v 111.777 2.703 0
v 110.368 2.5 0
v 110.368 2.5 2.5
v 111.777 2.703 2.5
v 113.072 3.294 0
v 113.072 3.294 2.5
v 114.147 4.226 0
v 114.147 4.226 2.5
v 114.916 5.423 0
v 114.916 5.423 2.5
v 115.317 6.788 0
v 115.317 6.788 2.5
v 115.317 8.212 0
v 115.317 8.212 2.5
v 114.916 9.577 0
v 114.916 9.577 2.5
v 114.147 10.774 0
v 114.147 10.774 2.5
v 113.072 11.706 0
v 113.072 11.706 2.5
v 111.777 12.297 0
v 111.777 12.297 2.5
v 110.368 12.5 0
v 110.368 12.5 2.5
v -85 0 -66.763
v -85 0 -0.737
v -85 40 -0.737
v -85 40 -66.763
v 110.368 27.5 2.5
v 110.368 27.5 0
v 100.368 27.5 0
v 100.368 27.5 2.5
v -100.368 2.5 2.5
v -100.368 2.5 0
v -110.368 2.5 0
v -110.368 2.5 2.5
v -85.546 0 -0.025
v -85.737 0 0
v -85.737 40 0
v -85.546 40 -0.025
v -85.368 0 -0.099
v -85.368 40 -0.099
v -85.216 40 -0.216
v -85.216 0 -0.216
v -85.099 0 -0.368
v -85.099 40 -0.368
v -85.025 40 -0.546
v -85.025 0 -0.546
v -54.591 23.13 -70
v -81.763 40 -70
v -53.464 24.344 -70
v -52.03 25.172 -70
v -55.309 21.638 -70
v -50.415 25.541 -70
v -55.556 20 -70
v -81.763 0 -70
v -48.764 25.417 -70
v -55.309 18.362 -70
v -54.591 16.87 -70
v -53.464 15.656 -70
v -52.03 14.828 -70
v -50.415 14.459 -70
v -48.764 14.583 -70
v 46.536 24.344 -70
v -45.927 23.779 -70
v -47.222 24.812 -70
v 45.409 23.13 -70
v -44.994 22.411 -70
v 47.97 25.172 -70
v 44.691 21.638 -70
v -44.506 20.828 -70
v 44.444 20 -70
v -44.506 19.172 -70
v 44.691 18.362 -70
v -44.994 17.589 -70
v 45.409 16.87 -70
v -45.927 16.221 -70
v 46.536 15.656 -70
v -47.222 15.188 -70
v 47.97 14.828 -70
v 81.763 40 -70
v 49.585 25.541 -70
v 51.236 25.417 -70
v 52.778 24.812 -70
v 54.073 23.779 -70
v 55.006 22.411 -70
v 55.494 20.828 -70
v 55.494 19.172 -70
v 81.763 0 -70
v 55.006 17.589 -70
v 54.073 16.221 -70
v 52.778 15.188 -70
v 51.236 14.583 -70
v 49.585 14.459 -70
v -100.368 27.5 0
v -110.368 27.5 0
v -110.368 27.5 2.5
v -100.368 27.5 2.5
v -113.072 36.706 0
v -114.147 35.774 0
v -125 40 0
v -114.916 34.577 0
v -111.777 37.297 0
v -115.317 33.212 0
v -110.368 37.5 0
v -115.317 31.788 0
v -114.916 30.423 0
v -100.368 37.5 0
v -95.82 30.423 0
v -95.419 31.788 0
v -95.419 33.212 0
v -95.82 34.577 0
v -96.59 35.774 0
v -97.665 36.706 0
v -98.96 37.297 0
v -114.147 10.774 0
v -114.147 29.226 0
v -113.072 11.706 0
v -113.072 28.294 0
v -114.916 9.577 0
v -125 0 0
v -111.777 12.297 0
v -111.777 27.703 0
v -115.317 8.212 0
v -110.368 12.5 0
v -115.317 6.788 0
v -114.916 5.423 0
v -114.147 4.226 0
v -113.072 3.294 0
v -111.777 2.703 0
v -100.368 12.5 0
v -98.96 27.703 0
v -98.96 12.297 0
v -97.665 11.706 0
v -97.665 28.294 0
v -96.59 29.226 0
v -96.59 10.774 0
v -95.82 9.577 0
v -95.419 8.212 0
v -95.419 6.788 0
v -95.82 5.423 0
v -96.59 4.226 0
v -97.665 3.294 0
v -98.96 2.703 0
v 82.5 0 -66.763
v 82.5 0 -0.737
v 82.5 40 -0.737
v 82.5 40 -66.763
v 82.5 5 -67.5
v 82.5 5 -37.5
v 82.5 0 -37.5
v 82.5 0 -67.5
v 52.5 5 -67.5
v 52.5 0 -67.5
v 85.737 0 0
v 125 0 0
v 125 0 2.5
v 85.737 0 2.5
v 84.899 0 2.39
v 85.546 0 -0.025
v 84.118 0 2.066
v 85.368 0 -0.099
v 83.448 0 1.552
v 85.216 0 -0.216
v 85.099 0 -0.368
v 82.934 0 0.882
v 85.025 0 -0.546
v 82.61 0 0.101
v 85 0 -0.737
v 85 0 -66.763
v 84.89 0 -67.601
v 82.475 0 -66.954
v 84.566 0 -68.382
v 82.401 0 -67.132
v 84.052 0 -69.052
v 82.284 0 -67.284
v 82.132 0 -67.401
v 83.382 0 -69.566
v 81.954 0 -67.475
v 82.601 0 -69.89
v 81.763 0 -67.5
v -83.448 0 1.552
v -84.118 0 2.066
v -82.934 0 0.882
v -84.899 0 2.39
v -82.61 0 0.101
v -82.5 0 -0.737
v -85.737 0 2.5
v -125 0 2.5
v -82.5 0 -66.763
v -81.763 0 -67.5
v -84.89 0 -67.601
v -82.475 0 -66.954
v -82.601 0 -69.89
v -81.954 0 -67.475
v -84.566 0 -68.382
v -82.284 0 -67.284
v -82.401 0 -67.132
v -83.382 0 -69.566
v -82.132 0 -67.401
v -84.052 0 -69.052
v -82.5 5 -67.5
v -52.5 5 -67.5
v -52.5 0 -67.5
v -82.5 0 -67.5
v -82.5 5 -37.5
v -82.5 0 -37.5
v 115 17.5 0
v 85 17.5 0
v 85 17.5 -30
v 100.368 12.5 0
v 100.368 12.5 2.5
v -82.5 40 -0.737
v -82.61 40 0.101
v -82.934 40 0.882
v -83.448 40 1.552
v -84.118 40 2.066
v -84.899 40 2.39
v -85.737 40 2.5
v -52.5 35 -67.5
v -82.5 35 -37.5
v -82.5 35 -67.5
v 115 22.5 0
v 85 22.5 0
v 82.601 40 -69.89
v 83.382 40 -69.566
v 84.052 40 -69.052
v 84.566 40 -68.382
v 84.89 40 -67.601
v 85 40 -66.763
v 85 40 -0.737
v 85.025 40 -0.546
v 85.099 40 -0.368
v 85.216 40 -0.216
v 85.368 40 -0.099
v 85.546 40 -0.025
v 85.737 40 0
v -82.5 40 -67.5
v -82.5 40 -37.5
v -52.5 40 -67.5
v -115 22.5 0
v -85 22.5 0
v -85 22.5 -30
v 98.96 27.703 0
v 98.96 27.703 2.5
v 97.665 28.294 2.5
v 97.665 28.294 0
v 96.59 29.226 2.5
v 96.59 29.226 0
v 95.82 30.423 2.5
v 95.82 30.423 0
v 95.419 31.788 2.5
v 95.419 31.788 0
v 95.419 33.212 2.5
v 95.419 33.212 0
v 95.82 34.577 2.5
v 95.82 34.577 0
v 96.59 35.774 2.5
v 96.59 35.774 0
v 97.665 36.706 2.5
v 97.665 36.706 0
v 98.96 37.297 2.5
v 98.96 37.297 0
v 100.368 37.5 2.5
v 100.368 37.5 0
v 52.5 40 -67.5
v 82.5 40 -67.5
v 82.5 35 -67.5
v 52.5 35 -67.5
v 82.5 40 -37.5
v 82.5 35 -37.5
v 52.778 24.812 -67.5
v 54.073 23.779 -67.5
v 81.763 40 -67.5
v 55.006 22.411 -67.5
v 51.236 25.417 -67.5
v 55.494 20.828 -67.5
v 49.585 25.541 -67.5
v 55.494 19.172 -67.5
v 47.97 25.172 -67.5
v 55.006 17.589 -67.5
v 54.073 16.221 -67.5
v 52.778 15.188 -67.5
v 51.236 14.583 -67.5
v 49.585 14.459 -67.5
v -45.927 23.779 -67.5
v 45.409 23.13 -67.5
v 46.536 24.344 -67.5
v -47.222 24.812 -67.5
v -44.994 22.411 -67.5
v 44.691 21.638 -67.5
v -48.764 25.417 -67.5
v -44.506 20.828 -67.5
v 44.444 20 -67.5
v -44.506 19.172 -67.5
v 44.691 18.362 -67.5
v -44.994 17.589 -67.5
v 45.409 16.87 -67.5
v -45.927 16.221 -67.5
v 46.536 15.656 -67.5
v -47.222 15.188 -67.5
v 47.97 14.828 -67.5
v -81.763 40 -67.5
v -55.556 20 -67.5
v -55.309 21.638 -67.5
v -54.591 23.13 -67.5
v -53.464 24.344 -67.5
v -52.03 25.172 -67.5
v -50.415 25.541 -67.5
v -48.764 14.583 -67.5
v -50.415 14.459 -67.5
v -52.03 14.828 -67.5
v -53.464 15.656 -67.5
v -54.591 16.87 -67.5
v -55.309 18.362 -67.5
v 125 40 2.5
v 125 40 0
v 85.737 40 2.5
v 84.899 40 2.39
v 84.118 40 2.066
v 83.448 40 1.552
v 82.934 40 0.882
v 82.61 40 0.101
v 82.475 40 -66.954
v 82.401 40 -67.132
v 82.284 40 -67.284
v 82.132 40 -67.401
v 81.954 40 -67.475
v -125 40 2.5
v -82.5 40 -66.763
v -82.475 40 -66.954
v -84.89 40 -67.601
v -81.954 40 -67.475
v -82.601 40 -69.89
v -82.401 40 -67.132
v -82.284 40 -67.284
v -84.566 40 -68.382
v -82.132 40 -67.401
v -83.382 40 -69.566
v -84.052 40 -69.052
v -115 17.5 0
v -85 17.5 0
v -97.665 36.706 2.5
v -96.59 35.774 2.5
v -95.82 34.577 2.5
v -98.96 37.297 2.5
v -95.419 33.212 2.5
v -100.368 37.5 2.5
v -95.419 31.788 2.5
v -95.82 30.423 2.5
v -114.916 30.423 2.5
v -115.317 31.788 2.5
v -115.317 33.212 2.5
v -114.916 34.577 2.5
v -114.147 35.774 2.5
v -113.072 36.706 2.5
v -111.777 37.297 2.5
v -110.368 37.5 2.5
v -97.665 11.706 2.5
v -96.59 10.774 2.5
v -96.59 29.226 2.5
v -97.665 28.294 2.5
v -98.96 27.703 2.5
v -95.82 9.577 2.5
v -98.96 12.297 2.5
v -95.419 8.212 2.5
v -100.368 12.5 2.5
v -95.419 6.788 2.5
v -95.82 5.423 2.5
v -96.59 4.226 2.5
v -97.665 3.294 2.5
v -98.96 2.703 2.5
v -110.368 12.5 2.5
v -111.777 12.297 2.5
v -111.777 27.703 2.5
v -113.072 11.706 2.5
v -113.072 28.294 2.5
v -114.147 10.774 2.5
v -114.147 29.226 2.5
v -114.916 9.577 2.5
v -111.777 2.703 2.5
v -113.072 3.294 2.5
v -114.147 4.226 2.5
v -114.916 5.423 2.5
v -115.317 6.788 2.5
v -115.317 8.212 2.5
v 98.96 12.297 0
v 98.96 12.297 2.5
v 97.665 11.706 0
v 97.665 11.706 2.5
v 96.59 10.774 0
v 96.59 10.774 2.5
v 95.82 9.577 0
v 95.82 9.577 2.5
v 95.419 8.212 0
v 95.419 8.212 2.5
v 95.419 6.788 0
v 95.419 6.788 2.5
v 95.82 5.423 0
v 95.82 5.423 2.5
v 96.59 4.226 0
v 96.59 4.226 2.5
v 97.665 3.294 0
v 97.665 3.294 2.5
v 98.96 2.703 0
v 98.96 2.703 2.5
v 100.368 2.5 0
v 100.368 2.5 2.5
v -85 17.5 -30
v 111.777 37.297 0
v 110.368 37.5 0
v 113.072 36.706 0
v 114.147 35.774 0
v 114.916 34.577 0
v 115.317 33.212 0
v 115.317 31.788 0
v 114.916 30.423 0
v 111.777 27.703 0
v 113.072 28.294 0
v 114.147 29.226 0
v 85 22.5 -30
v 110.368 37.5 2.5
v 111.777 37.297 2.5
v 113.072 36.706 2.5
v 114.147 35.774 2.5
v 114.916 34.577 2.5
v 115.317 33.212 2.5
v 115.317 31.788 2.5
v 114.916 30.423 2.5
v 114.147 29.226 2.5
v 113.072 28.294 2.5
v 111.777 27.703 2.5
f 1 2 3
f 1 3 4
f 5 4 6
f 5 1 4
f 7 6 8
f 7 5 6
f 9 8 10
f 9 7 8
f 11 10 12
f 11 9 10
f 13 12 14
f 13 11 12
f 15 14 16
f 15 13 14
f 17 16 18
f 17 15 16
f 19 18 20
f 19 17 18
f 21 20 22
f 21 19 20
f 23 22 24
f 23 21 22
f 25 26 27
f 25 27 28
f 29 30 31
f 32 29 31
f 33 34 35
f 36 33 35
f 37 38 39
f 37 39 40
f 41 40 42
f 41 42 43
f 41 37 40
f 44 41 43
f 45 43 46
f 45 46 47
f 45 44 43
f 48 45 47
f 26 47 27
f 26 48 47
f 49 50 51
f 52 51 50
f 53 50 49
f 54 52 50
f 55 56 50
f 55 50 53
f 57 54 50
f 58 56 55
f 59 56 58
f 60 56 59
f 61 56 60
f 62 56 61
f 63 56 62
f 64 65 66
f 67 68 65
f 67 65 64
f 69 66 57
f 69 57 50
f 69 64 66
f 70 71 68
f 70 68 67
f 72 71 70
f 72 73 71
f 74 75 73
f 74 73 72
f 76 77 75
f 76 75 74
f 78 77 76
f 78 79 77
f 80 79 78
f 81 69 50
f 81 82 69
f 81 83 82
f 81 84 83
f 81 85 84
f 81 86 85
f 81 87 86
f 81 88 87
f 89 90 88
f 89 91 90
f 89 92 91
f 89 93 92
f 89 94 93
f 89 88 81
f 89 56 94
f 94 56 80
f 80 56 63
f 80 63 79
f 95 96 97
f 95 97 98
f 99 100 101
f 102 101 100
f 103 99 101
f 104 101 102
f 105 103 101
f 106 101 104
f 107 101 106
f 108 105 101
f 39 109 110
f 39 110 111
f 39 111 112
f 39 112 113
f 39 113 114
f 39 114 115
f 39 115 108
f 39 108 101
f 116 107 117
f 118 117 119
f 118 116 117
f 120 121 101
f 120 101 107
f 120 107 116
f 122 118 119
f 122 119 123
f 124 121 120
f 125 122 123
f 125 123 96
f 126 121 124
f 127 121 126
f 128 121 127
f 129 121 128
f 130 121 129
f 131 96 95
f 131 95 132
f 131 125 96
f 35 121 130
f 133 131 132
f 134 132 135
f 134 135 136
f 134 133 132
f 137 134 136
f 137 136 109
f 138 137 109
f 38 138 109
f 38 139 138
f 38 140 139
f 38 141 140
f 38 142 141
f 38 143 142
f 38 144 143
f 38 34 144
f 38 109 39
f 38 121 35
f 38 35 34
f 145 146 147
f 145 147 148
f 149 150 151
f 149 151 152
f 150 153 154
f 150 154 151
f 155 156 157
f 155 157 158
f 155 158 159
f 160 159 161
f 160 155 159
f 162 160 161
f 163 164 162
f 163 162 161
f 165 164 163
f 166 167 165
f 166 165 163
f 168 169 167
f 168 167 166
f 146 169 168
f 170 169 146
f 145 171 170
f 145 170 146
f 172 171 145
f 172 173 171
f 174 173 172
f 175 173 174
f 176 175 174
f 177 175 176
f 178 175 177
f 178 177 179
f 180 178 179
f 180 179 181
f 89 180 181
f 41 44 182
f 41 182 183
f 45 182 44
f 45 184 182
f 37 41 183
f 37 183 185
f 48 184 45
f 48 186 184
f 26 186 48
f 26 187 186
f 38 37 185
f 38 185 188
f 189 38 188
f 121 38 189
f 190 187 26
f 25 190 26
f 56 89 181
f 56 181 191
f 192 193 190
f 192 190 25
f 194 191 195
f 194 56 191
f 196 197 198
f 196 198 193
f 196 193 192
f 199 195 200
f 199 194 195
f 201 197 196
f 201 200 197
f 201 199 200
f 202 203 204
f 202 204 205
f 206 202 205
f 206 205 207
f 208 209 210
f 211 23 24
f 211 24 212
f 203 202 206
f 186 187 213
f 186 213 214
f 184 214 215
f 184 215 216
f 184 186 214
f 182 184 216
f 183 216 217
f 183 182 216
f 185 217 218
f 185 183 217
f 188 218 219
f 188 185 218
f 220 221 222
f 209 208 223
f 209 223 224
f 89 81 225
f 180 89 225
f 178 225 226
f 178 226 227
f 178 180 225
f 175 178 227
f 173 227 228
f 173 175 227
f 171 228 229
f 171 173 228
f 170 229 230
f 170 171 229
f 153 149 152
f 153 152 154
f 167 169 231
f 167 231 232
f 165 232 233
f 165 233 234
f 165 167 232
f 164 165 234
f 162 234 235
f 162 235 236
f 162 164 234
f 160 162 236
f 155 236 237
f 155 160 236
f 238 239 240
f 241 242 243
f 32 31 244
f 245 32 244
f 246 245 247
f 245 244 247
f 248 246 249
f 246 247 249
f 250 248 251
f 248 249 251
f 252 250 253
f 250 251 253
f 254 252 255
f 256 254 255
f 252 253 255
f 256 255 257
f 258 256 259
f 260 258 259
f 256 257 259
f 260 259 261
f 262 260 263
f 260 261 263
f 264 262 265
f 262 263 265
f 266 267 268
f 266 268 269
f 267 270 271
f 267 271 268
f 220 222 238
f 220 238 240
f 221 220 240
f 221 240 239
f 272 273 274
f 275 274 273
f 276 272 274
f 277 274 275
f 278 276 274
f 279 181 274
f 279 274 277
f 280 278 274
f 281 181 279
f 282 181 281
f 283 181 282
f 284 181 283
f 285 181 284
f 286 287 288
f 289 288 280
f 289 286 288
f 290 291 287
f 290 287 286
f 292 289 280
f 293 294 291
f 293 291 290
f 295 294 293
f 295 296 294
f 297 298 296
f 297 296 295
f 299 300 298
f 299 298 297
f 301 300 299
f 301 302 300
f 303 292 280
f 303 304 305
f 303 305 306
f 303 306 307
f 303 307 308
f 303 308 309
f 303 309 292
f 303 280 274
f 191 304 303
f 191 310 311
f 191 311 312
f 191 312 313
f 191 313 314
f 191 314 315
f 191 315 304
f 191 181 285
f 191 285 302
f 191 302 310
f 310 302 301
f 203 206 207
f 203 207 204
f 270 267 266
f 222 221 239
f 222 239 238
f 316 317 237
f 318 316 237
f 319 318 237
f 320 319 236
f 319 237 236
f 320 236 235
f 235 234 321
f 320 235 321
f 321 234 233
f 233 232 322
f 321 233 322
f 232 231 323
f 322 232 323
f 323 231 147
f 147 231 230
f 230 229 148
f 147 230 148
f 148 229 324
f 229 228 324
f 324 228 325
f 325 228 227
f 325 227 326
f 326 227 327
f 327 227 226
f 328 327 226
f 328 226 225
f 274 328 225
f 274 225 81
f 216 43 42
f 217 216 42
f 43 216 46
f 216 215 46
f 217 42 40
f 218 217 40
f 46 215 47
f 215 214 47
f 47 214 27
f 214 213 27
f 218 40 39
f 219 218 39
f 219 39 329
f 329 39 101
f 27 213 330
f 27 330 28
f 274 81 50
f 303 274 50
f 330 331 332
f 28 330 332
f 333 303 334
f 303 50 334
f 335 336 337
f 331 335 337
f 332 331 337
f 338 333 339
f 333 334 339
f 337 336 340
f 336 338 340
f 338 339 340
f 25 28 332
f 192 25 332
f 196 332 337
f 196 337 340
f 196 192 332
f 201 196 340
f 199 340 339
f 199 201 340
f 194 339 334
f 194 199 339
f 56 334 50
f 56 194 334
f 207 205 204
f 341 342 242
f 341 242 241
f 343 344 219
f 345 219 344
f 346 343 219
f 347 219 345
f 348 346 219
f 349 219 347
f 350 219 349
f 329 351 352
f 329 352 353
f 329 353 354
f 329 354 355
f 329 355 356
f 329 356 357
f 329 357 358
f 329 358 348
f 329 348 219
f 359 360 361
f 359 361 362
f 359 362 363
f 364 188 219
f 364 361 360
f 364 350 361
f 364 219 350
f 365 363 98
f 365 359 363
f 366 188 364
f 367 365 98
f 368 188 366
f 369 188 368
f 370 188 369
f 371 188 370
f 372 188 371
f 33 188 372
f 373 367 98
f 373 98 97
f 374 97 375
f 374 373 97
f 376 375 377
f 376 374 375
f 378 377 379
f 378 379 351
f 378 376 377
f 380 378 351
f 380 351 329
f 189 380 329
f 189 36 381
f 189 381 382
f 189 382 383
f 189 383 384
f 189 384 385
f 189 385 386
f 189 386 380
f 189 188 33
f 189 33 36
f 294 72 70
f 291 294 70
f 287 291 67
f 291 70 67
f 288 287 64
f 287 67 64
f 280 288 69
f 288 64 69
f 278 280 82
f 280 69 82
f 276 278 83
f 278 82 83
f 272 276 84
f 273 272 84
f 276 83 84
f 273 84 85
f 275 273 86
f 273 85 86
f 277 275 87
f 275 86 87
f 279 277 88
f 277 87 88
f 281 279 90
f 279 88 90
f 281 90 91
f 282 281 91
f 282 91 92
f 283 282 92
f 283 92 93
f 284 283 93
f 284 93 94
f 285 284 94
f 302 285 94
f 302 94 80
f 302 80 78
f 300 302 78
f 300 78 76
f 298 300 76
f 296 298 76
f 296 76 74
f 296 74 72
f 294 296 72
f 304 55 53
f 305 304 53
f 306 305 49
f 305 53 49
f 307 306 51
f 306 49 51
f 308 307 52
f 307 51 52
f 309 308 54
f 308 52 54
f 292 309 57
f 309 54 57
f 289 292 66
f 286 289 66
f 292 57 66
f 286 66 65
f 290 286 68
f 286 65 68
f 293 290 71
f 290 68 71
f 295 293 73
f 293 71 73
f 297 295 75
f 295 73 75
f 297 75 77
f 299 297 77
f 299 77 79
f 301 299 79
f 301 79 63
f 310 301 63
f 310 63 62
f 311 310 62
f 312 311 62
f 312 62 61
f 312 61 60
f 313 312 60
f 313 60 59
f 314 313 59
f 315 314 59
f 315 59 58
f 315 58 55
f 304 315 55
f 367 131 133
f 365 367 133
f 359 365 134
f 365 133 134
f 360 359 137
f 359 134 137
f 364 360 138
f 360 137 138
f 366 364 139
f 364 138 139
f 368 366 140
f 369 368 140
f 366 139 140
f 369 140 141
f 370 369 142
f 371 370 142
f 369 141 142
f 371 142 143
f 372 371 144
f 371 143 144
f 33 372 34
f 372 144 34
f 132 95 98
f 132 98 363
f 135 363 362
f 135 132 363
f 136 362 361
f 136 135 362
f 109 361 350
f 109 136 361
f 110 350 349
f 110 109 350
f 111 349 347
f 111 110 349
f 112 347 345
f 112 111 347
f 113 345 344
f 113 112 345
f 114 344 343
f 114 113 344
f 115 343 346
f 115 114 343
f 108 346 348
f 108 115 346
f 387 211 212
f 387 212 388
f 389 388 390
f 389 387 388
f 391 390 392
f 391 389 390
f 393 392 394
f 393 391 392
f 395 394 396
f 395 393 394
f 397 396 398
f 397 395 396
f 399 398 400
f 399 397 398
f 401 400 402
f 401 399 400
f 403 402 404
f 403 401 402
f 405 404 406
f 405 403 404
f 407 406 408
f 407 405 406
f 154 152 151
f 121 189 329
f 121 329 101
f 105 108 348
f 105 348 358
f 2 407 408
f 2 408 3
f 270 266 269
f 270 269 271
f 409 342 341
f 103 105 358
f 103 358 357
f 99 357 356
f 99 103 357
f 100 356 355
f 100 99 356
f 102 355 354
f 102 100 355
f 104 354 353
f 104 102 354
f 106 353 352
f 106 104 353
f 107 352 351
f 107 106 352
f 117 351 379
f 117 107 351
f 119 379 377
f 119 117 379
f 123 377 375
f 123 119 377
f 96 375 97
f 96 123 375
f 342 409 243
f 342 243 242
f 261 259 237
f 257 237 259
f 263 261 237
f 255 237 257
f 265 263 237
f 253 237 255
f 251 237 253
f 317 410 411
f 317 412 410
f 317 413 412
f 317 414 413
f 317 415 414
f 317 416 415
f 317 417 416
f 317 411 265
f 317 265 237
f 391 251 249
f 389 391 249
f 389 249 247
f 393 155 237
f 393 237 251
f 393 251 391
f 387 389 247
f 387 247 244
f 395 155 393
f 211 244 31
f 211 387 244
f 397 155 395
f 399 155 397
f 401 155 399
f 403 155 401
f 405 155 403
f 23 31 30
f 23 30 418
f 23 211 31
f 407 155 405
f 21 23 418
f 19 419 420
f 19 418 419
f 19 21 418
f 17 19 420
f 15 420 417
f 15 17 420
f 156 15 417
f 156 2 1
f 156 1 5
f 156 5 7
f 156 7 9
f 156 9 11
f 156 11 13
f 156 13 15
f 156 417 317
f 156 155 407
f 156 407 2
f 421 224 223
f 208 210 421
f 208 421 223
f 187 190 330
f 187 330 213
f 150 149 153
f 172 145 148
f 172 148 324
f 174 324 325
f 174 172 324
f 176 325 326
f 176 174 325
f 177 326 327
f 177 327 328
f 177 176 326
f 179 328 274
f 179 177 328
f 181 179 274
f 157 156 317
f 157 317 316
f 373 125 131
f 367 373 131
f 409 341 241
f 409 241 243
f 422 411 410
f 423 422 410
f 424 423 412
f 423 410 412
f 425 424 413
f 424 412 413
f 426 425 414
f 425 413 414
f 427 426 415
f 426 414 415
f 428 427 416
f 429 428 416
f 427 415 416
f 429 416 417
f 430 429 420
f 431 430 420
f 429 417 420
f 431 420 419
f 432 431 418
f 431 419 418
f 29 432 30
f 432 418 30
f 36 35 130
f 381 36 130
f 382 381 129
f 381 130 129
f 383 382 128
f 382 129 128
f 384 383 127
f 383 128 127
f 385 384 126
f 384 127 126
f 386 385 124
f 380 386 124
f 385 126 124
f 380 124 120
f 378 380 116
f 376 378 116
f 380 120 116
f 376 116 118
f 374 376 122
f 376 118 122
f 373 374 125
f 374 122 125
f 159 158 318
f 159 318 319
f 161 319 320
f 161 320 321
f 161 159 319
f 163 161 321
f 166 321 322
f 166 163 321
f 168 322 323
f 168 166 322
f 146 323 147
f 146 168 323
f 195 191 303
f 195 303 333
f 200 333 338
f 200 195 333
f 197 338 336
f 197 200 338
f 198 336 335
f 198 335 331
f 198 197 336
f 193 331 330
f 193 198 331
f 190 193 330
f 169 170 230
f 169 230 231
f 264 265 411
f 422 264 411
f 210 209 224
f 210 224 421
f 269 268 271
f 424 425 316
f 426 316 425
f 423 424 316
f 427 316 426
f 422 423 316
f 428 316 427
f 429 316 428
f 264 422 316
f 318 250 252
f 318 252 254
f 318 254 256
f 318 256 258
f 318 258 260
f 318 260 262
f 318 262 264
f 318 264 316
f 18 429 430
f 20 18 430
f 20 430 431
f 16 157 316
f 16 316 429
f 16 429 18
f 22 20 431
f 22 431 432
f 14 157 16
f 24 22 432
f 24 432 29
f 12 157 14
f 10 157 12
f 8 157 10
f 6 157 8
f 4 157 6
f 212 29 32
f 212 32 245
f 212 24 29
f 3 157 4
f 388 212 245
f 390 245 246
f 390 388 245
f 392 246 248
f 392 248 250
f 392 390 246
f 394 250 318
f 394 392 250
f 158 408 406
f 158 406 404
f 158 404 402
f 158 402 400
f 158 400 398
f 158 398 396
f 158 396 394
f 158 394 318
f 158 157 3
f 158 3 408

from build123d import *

# Parameters (mm, degrees)
BASE_FLANGE1_DEPTH = 40
GUSSET5_THICKNESS  = 5
GUSSET7_THICKNESS  = 5
SKETCH10_R         = 5.55625
CUT_EXTRUDE2_DEPTH = 150.937486974
GUSSET9_THICKNESS  = 5
GUSSET10_THICKNESS = 5
GUSSET11_THICKNESS = 5
GUSSET12_THICKNESS = 5
CUT_EXTRUDE3_DEPTH = 149.744747806


# Sheet-metal steps are written as plain solids
with BuildPart() as part:
    # Sketch1 → Base-Flange1 (new body)
    with BuildSketch(Plane(origin=(0, 0, 0), x_dir=(1, 0, 0), z_dir=(0, 1, 0))):
        with BuildLine():
            Line((-125, 0), (-85.7366, 0))
            ThreePointArc((-85.7366, 0), (-85.215745145, 0.215745145), (-85, 0.7366))
            Line((-85, 0.7366), (-85, 66.7634))
            ThreePointArc((-85, 66.7634), (-84.052021808, 69.052021808), (-81.7634, 70))
            Line((-81.7634, 70), (81.7634, 70))
            ThreePointArc((81.7634, 70), (84.052021808, 69.052021808), (85, 66.7634))
            Line((85, 66.7634), (85, 0.7366))
            ThreePointArc((85, 0.7366), (85.215745145, 0.215745145), (85.7366, 0))
            Line((85.7366, 0), (125, 0))
            Line((125, 0), (125, -2.5))
            Line((125, -2.5), (85.7366, -2.5))
            ThreePointArc((85.7366, -2.5), (83.447978192, -1.552021808), (82.5, 0.7366))
            Line((82.5, 0.7366), (82.5, 66.7634))
            ThreePointArc((82.5, 66.7634), (82.284254855, 67.284254855), (81.7634, 67.5))
            Line((81.7634, 67.5), (-81.7634, 67.5))
            ThreePointArc((-81.7634, 67.5), (-82.284254855, 67.284254855), (-82.5, 66.7634))
            Line((-82.5, 66.7634), (-82.5, 0.7366))
            ThreePointArc((-82.5, 0.7366), (-83.447978192, -1.552021808), (-85.7366, -2.5))
            Line((-85.7366, -2.5), (-125, -2.5))
            Line((-125, -2.5), (-125, 0))
        make_face()
    extrude(amount=BASE_FLANGE1_DEPTH)

    # Sketch10 → Cut-Extrude2 (cut, through all)
    with BuildSketch(Plane(origin=(0, 0, -70), x_dir=(-1, 0, 0), z_dir=(0, 0, -1))):
        with Locations((-50, 20)):
            Circle(SKETCH10_R)
        with Locations((50, 20)):
            Circle(SKETCH10_R)
    extrude(amount=-CUT_EXTRUDE2_DEPTH, mode=Mode.SUBTRACT)

    # Sketch15 → Cut-Extrude3 (cut, through all)
    with BuildSketch(Plane(origin=(0, 0, 0), x_dir=(-1, 0, 0), z_dir=(0, 0, -1))):
        with BuildLine():
            Line((-110.3683, 12.5), (-100.3683, 12.5))
            ThreePointArc((-100.3683, 12.5), (-95.3683, 7.5), (-100.3683, 2.5))
            Line((-100.3683, 2.5), (-110.3683, 2.5))
            ThreePointArc((-110.3683, 2.5), (-115.3683, 7.5), (-110.3683, 12.5))
        make_face()
        with BuildLine():
            Line((110.3683, 12.5), (100.3683, 12.5))
            ThreePointArc((100.3683, 12.5), (95.3683, 7.5), (100.3683, 2.5))
            Line((100.3683, 2.5), (110.3683, 2.5))
            ThreePointArc((110.3683, 2.5), (115.3683, 7.5), (110.3683, 12.5))
        make_face()
        with BuildLine():
            Line((-110.3683, 27.5), (-100.3683, 27.5))
            ThreePointArc((-100.3683, 27.5), (-95.3683, 32.5), (-100.3683, 37.5))
            Line((-100.3683, 37.5), (-110.3683, 37.5))
            ThreePointArc((-110.3683, 37.5), (-115.3683, 32.5), (-110.3683, 27.5))
        make_face()
        with BuildLine():
            Line((110.3683, 27.5), (100.3683, 27.5))
            ThreePointArc((100.3683, 27.5), (95.3683, 32.5), (100.3683, 37.5))
            Line((100.3683, 37.5), (110.3683, 37.5))
            ThreePointArc((110.3683, 37.5), (115.3683, 32.5), (110.3683, 27.5))
        make_face()
    extrude(amount=-CUT_EXTRUDE3_DEPTH, mode=Mode.SUBTRACT)


with BuildPart() as body_2:
    # Gusset5: a gusset: a plate 5.0 thick in the corner of two members, its outline drawn in place
    gusset5_outline = Wire([Line((-85, 17.5, 0), (-115, 17.5, 0)), Line((-115, 17.5, 0), (-85, 17.5, -30)), Line((-85, 17.5, -30), (-85, 17.5, 0))])
    add(extrude(Face(gusset5_outline), amount=GUSSET5_THICKNESS, dir=(0, 1, 0)))


with BuildPart() as body_3:
    # Gusset7: a gusset: a plate 5.0 thick in the corner of two members, its outline drawn in place
    gusset7_outline = Wire([Line((85, 17.5, 0), (85, 17.5, -30)), Line((85, 17.5, -30), (115, 17.5, 0)), Line((115, 17.5, 0), (85, 17.5, 0))])
    add(extrude(Face(gusset7_outline), amount=GUSSET7_THICKNESS, dir=(0, 1, 0)))


with BuildPart() as body_4:
    # Gusset9: a gusset: a plate 5.0 thick in the corner of two members, its outline drawn in place
    gusset9_outline = Wire([Line((-82.5, 35, -67.5), (-52.5, 35, -67.5)), Line((-52.5, 35, -67.5), (-82.5, 35, -37.5)), Line((-82.5, 35, -37.5), (-82.5, 35, -67.5))])
    add(extrude(Face(gusset9_outline), amount=GUSSET9_THICKNESS, dir=(0, 1, 0)))


with BuildPart() as body_5:
    # Gusset10: a gusset: a plate 5.0 thick in the corner of two members, its outline drawn in place
    gusset10_outline = Wire([Line((-82.5, 5, -67.5), (-82.5, 5, -37.5)), Line((-82.5, 5, -37.5), (-52.5, 5, -67.5)), Line((-52.5, 5, -67.5), (-82.5, 5, -67.5))])
    add(extrude(Face(gusset10_outline), amount=GUSSET10_THICKNESS, dir=(0, -1, 0)))


with BuildPart() as body_6:
    # Gusset11: a gusset: a plate 5.0 thick in the corner of two members, its outline drawn in place
    gusset11_outline = Wire([Line((82.5, 5, -67.5), (52.5, 5, -67.5)), Line((52.5, 5, -67.5), (82.5, 5, -37.5)), Line((82.5, 5, -37.5), (82.5, 5, -67.5))])
    add(extrude(Face(gusset11_outline), amount=GUSSET11_THICKNESS, dir=(0, -1, 0)))


with BuildPart() as body_7:
    # Gusset12: a gusset: a plate 5.0 thick in the corner of two members, its outline drawn in place
    gusset12_outline = Wire([Line((82.5, 40, -67.5), (52.5, 40, -67.5)), Line((52.5, 40, -67.5), (82.5, 40, -37.5)), Line((82.5, 40, -37.5), (82.5, 40, -67.5))])
    add(extrude(Face(gusset12_outline), amount=GUSSET12_THICKNESS, dir=(0, -1, 0)))


solid = Compound([part.part, body_2.part, body_3.part, body_4.part, body_5.part, body_6.part, body_7.part])
